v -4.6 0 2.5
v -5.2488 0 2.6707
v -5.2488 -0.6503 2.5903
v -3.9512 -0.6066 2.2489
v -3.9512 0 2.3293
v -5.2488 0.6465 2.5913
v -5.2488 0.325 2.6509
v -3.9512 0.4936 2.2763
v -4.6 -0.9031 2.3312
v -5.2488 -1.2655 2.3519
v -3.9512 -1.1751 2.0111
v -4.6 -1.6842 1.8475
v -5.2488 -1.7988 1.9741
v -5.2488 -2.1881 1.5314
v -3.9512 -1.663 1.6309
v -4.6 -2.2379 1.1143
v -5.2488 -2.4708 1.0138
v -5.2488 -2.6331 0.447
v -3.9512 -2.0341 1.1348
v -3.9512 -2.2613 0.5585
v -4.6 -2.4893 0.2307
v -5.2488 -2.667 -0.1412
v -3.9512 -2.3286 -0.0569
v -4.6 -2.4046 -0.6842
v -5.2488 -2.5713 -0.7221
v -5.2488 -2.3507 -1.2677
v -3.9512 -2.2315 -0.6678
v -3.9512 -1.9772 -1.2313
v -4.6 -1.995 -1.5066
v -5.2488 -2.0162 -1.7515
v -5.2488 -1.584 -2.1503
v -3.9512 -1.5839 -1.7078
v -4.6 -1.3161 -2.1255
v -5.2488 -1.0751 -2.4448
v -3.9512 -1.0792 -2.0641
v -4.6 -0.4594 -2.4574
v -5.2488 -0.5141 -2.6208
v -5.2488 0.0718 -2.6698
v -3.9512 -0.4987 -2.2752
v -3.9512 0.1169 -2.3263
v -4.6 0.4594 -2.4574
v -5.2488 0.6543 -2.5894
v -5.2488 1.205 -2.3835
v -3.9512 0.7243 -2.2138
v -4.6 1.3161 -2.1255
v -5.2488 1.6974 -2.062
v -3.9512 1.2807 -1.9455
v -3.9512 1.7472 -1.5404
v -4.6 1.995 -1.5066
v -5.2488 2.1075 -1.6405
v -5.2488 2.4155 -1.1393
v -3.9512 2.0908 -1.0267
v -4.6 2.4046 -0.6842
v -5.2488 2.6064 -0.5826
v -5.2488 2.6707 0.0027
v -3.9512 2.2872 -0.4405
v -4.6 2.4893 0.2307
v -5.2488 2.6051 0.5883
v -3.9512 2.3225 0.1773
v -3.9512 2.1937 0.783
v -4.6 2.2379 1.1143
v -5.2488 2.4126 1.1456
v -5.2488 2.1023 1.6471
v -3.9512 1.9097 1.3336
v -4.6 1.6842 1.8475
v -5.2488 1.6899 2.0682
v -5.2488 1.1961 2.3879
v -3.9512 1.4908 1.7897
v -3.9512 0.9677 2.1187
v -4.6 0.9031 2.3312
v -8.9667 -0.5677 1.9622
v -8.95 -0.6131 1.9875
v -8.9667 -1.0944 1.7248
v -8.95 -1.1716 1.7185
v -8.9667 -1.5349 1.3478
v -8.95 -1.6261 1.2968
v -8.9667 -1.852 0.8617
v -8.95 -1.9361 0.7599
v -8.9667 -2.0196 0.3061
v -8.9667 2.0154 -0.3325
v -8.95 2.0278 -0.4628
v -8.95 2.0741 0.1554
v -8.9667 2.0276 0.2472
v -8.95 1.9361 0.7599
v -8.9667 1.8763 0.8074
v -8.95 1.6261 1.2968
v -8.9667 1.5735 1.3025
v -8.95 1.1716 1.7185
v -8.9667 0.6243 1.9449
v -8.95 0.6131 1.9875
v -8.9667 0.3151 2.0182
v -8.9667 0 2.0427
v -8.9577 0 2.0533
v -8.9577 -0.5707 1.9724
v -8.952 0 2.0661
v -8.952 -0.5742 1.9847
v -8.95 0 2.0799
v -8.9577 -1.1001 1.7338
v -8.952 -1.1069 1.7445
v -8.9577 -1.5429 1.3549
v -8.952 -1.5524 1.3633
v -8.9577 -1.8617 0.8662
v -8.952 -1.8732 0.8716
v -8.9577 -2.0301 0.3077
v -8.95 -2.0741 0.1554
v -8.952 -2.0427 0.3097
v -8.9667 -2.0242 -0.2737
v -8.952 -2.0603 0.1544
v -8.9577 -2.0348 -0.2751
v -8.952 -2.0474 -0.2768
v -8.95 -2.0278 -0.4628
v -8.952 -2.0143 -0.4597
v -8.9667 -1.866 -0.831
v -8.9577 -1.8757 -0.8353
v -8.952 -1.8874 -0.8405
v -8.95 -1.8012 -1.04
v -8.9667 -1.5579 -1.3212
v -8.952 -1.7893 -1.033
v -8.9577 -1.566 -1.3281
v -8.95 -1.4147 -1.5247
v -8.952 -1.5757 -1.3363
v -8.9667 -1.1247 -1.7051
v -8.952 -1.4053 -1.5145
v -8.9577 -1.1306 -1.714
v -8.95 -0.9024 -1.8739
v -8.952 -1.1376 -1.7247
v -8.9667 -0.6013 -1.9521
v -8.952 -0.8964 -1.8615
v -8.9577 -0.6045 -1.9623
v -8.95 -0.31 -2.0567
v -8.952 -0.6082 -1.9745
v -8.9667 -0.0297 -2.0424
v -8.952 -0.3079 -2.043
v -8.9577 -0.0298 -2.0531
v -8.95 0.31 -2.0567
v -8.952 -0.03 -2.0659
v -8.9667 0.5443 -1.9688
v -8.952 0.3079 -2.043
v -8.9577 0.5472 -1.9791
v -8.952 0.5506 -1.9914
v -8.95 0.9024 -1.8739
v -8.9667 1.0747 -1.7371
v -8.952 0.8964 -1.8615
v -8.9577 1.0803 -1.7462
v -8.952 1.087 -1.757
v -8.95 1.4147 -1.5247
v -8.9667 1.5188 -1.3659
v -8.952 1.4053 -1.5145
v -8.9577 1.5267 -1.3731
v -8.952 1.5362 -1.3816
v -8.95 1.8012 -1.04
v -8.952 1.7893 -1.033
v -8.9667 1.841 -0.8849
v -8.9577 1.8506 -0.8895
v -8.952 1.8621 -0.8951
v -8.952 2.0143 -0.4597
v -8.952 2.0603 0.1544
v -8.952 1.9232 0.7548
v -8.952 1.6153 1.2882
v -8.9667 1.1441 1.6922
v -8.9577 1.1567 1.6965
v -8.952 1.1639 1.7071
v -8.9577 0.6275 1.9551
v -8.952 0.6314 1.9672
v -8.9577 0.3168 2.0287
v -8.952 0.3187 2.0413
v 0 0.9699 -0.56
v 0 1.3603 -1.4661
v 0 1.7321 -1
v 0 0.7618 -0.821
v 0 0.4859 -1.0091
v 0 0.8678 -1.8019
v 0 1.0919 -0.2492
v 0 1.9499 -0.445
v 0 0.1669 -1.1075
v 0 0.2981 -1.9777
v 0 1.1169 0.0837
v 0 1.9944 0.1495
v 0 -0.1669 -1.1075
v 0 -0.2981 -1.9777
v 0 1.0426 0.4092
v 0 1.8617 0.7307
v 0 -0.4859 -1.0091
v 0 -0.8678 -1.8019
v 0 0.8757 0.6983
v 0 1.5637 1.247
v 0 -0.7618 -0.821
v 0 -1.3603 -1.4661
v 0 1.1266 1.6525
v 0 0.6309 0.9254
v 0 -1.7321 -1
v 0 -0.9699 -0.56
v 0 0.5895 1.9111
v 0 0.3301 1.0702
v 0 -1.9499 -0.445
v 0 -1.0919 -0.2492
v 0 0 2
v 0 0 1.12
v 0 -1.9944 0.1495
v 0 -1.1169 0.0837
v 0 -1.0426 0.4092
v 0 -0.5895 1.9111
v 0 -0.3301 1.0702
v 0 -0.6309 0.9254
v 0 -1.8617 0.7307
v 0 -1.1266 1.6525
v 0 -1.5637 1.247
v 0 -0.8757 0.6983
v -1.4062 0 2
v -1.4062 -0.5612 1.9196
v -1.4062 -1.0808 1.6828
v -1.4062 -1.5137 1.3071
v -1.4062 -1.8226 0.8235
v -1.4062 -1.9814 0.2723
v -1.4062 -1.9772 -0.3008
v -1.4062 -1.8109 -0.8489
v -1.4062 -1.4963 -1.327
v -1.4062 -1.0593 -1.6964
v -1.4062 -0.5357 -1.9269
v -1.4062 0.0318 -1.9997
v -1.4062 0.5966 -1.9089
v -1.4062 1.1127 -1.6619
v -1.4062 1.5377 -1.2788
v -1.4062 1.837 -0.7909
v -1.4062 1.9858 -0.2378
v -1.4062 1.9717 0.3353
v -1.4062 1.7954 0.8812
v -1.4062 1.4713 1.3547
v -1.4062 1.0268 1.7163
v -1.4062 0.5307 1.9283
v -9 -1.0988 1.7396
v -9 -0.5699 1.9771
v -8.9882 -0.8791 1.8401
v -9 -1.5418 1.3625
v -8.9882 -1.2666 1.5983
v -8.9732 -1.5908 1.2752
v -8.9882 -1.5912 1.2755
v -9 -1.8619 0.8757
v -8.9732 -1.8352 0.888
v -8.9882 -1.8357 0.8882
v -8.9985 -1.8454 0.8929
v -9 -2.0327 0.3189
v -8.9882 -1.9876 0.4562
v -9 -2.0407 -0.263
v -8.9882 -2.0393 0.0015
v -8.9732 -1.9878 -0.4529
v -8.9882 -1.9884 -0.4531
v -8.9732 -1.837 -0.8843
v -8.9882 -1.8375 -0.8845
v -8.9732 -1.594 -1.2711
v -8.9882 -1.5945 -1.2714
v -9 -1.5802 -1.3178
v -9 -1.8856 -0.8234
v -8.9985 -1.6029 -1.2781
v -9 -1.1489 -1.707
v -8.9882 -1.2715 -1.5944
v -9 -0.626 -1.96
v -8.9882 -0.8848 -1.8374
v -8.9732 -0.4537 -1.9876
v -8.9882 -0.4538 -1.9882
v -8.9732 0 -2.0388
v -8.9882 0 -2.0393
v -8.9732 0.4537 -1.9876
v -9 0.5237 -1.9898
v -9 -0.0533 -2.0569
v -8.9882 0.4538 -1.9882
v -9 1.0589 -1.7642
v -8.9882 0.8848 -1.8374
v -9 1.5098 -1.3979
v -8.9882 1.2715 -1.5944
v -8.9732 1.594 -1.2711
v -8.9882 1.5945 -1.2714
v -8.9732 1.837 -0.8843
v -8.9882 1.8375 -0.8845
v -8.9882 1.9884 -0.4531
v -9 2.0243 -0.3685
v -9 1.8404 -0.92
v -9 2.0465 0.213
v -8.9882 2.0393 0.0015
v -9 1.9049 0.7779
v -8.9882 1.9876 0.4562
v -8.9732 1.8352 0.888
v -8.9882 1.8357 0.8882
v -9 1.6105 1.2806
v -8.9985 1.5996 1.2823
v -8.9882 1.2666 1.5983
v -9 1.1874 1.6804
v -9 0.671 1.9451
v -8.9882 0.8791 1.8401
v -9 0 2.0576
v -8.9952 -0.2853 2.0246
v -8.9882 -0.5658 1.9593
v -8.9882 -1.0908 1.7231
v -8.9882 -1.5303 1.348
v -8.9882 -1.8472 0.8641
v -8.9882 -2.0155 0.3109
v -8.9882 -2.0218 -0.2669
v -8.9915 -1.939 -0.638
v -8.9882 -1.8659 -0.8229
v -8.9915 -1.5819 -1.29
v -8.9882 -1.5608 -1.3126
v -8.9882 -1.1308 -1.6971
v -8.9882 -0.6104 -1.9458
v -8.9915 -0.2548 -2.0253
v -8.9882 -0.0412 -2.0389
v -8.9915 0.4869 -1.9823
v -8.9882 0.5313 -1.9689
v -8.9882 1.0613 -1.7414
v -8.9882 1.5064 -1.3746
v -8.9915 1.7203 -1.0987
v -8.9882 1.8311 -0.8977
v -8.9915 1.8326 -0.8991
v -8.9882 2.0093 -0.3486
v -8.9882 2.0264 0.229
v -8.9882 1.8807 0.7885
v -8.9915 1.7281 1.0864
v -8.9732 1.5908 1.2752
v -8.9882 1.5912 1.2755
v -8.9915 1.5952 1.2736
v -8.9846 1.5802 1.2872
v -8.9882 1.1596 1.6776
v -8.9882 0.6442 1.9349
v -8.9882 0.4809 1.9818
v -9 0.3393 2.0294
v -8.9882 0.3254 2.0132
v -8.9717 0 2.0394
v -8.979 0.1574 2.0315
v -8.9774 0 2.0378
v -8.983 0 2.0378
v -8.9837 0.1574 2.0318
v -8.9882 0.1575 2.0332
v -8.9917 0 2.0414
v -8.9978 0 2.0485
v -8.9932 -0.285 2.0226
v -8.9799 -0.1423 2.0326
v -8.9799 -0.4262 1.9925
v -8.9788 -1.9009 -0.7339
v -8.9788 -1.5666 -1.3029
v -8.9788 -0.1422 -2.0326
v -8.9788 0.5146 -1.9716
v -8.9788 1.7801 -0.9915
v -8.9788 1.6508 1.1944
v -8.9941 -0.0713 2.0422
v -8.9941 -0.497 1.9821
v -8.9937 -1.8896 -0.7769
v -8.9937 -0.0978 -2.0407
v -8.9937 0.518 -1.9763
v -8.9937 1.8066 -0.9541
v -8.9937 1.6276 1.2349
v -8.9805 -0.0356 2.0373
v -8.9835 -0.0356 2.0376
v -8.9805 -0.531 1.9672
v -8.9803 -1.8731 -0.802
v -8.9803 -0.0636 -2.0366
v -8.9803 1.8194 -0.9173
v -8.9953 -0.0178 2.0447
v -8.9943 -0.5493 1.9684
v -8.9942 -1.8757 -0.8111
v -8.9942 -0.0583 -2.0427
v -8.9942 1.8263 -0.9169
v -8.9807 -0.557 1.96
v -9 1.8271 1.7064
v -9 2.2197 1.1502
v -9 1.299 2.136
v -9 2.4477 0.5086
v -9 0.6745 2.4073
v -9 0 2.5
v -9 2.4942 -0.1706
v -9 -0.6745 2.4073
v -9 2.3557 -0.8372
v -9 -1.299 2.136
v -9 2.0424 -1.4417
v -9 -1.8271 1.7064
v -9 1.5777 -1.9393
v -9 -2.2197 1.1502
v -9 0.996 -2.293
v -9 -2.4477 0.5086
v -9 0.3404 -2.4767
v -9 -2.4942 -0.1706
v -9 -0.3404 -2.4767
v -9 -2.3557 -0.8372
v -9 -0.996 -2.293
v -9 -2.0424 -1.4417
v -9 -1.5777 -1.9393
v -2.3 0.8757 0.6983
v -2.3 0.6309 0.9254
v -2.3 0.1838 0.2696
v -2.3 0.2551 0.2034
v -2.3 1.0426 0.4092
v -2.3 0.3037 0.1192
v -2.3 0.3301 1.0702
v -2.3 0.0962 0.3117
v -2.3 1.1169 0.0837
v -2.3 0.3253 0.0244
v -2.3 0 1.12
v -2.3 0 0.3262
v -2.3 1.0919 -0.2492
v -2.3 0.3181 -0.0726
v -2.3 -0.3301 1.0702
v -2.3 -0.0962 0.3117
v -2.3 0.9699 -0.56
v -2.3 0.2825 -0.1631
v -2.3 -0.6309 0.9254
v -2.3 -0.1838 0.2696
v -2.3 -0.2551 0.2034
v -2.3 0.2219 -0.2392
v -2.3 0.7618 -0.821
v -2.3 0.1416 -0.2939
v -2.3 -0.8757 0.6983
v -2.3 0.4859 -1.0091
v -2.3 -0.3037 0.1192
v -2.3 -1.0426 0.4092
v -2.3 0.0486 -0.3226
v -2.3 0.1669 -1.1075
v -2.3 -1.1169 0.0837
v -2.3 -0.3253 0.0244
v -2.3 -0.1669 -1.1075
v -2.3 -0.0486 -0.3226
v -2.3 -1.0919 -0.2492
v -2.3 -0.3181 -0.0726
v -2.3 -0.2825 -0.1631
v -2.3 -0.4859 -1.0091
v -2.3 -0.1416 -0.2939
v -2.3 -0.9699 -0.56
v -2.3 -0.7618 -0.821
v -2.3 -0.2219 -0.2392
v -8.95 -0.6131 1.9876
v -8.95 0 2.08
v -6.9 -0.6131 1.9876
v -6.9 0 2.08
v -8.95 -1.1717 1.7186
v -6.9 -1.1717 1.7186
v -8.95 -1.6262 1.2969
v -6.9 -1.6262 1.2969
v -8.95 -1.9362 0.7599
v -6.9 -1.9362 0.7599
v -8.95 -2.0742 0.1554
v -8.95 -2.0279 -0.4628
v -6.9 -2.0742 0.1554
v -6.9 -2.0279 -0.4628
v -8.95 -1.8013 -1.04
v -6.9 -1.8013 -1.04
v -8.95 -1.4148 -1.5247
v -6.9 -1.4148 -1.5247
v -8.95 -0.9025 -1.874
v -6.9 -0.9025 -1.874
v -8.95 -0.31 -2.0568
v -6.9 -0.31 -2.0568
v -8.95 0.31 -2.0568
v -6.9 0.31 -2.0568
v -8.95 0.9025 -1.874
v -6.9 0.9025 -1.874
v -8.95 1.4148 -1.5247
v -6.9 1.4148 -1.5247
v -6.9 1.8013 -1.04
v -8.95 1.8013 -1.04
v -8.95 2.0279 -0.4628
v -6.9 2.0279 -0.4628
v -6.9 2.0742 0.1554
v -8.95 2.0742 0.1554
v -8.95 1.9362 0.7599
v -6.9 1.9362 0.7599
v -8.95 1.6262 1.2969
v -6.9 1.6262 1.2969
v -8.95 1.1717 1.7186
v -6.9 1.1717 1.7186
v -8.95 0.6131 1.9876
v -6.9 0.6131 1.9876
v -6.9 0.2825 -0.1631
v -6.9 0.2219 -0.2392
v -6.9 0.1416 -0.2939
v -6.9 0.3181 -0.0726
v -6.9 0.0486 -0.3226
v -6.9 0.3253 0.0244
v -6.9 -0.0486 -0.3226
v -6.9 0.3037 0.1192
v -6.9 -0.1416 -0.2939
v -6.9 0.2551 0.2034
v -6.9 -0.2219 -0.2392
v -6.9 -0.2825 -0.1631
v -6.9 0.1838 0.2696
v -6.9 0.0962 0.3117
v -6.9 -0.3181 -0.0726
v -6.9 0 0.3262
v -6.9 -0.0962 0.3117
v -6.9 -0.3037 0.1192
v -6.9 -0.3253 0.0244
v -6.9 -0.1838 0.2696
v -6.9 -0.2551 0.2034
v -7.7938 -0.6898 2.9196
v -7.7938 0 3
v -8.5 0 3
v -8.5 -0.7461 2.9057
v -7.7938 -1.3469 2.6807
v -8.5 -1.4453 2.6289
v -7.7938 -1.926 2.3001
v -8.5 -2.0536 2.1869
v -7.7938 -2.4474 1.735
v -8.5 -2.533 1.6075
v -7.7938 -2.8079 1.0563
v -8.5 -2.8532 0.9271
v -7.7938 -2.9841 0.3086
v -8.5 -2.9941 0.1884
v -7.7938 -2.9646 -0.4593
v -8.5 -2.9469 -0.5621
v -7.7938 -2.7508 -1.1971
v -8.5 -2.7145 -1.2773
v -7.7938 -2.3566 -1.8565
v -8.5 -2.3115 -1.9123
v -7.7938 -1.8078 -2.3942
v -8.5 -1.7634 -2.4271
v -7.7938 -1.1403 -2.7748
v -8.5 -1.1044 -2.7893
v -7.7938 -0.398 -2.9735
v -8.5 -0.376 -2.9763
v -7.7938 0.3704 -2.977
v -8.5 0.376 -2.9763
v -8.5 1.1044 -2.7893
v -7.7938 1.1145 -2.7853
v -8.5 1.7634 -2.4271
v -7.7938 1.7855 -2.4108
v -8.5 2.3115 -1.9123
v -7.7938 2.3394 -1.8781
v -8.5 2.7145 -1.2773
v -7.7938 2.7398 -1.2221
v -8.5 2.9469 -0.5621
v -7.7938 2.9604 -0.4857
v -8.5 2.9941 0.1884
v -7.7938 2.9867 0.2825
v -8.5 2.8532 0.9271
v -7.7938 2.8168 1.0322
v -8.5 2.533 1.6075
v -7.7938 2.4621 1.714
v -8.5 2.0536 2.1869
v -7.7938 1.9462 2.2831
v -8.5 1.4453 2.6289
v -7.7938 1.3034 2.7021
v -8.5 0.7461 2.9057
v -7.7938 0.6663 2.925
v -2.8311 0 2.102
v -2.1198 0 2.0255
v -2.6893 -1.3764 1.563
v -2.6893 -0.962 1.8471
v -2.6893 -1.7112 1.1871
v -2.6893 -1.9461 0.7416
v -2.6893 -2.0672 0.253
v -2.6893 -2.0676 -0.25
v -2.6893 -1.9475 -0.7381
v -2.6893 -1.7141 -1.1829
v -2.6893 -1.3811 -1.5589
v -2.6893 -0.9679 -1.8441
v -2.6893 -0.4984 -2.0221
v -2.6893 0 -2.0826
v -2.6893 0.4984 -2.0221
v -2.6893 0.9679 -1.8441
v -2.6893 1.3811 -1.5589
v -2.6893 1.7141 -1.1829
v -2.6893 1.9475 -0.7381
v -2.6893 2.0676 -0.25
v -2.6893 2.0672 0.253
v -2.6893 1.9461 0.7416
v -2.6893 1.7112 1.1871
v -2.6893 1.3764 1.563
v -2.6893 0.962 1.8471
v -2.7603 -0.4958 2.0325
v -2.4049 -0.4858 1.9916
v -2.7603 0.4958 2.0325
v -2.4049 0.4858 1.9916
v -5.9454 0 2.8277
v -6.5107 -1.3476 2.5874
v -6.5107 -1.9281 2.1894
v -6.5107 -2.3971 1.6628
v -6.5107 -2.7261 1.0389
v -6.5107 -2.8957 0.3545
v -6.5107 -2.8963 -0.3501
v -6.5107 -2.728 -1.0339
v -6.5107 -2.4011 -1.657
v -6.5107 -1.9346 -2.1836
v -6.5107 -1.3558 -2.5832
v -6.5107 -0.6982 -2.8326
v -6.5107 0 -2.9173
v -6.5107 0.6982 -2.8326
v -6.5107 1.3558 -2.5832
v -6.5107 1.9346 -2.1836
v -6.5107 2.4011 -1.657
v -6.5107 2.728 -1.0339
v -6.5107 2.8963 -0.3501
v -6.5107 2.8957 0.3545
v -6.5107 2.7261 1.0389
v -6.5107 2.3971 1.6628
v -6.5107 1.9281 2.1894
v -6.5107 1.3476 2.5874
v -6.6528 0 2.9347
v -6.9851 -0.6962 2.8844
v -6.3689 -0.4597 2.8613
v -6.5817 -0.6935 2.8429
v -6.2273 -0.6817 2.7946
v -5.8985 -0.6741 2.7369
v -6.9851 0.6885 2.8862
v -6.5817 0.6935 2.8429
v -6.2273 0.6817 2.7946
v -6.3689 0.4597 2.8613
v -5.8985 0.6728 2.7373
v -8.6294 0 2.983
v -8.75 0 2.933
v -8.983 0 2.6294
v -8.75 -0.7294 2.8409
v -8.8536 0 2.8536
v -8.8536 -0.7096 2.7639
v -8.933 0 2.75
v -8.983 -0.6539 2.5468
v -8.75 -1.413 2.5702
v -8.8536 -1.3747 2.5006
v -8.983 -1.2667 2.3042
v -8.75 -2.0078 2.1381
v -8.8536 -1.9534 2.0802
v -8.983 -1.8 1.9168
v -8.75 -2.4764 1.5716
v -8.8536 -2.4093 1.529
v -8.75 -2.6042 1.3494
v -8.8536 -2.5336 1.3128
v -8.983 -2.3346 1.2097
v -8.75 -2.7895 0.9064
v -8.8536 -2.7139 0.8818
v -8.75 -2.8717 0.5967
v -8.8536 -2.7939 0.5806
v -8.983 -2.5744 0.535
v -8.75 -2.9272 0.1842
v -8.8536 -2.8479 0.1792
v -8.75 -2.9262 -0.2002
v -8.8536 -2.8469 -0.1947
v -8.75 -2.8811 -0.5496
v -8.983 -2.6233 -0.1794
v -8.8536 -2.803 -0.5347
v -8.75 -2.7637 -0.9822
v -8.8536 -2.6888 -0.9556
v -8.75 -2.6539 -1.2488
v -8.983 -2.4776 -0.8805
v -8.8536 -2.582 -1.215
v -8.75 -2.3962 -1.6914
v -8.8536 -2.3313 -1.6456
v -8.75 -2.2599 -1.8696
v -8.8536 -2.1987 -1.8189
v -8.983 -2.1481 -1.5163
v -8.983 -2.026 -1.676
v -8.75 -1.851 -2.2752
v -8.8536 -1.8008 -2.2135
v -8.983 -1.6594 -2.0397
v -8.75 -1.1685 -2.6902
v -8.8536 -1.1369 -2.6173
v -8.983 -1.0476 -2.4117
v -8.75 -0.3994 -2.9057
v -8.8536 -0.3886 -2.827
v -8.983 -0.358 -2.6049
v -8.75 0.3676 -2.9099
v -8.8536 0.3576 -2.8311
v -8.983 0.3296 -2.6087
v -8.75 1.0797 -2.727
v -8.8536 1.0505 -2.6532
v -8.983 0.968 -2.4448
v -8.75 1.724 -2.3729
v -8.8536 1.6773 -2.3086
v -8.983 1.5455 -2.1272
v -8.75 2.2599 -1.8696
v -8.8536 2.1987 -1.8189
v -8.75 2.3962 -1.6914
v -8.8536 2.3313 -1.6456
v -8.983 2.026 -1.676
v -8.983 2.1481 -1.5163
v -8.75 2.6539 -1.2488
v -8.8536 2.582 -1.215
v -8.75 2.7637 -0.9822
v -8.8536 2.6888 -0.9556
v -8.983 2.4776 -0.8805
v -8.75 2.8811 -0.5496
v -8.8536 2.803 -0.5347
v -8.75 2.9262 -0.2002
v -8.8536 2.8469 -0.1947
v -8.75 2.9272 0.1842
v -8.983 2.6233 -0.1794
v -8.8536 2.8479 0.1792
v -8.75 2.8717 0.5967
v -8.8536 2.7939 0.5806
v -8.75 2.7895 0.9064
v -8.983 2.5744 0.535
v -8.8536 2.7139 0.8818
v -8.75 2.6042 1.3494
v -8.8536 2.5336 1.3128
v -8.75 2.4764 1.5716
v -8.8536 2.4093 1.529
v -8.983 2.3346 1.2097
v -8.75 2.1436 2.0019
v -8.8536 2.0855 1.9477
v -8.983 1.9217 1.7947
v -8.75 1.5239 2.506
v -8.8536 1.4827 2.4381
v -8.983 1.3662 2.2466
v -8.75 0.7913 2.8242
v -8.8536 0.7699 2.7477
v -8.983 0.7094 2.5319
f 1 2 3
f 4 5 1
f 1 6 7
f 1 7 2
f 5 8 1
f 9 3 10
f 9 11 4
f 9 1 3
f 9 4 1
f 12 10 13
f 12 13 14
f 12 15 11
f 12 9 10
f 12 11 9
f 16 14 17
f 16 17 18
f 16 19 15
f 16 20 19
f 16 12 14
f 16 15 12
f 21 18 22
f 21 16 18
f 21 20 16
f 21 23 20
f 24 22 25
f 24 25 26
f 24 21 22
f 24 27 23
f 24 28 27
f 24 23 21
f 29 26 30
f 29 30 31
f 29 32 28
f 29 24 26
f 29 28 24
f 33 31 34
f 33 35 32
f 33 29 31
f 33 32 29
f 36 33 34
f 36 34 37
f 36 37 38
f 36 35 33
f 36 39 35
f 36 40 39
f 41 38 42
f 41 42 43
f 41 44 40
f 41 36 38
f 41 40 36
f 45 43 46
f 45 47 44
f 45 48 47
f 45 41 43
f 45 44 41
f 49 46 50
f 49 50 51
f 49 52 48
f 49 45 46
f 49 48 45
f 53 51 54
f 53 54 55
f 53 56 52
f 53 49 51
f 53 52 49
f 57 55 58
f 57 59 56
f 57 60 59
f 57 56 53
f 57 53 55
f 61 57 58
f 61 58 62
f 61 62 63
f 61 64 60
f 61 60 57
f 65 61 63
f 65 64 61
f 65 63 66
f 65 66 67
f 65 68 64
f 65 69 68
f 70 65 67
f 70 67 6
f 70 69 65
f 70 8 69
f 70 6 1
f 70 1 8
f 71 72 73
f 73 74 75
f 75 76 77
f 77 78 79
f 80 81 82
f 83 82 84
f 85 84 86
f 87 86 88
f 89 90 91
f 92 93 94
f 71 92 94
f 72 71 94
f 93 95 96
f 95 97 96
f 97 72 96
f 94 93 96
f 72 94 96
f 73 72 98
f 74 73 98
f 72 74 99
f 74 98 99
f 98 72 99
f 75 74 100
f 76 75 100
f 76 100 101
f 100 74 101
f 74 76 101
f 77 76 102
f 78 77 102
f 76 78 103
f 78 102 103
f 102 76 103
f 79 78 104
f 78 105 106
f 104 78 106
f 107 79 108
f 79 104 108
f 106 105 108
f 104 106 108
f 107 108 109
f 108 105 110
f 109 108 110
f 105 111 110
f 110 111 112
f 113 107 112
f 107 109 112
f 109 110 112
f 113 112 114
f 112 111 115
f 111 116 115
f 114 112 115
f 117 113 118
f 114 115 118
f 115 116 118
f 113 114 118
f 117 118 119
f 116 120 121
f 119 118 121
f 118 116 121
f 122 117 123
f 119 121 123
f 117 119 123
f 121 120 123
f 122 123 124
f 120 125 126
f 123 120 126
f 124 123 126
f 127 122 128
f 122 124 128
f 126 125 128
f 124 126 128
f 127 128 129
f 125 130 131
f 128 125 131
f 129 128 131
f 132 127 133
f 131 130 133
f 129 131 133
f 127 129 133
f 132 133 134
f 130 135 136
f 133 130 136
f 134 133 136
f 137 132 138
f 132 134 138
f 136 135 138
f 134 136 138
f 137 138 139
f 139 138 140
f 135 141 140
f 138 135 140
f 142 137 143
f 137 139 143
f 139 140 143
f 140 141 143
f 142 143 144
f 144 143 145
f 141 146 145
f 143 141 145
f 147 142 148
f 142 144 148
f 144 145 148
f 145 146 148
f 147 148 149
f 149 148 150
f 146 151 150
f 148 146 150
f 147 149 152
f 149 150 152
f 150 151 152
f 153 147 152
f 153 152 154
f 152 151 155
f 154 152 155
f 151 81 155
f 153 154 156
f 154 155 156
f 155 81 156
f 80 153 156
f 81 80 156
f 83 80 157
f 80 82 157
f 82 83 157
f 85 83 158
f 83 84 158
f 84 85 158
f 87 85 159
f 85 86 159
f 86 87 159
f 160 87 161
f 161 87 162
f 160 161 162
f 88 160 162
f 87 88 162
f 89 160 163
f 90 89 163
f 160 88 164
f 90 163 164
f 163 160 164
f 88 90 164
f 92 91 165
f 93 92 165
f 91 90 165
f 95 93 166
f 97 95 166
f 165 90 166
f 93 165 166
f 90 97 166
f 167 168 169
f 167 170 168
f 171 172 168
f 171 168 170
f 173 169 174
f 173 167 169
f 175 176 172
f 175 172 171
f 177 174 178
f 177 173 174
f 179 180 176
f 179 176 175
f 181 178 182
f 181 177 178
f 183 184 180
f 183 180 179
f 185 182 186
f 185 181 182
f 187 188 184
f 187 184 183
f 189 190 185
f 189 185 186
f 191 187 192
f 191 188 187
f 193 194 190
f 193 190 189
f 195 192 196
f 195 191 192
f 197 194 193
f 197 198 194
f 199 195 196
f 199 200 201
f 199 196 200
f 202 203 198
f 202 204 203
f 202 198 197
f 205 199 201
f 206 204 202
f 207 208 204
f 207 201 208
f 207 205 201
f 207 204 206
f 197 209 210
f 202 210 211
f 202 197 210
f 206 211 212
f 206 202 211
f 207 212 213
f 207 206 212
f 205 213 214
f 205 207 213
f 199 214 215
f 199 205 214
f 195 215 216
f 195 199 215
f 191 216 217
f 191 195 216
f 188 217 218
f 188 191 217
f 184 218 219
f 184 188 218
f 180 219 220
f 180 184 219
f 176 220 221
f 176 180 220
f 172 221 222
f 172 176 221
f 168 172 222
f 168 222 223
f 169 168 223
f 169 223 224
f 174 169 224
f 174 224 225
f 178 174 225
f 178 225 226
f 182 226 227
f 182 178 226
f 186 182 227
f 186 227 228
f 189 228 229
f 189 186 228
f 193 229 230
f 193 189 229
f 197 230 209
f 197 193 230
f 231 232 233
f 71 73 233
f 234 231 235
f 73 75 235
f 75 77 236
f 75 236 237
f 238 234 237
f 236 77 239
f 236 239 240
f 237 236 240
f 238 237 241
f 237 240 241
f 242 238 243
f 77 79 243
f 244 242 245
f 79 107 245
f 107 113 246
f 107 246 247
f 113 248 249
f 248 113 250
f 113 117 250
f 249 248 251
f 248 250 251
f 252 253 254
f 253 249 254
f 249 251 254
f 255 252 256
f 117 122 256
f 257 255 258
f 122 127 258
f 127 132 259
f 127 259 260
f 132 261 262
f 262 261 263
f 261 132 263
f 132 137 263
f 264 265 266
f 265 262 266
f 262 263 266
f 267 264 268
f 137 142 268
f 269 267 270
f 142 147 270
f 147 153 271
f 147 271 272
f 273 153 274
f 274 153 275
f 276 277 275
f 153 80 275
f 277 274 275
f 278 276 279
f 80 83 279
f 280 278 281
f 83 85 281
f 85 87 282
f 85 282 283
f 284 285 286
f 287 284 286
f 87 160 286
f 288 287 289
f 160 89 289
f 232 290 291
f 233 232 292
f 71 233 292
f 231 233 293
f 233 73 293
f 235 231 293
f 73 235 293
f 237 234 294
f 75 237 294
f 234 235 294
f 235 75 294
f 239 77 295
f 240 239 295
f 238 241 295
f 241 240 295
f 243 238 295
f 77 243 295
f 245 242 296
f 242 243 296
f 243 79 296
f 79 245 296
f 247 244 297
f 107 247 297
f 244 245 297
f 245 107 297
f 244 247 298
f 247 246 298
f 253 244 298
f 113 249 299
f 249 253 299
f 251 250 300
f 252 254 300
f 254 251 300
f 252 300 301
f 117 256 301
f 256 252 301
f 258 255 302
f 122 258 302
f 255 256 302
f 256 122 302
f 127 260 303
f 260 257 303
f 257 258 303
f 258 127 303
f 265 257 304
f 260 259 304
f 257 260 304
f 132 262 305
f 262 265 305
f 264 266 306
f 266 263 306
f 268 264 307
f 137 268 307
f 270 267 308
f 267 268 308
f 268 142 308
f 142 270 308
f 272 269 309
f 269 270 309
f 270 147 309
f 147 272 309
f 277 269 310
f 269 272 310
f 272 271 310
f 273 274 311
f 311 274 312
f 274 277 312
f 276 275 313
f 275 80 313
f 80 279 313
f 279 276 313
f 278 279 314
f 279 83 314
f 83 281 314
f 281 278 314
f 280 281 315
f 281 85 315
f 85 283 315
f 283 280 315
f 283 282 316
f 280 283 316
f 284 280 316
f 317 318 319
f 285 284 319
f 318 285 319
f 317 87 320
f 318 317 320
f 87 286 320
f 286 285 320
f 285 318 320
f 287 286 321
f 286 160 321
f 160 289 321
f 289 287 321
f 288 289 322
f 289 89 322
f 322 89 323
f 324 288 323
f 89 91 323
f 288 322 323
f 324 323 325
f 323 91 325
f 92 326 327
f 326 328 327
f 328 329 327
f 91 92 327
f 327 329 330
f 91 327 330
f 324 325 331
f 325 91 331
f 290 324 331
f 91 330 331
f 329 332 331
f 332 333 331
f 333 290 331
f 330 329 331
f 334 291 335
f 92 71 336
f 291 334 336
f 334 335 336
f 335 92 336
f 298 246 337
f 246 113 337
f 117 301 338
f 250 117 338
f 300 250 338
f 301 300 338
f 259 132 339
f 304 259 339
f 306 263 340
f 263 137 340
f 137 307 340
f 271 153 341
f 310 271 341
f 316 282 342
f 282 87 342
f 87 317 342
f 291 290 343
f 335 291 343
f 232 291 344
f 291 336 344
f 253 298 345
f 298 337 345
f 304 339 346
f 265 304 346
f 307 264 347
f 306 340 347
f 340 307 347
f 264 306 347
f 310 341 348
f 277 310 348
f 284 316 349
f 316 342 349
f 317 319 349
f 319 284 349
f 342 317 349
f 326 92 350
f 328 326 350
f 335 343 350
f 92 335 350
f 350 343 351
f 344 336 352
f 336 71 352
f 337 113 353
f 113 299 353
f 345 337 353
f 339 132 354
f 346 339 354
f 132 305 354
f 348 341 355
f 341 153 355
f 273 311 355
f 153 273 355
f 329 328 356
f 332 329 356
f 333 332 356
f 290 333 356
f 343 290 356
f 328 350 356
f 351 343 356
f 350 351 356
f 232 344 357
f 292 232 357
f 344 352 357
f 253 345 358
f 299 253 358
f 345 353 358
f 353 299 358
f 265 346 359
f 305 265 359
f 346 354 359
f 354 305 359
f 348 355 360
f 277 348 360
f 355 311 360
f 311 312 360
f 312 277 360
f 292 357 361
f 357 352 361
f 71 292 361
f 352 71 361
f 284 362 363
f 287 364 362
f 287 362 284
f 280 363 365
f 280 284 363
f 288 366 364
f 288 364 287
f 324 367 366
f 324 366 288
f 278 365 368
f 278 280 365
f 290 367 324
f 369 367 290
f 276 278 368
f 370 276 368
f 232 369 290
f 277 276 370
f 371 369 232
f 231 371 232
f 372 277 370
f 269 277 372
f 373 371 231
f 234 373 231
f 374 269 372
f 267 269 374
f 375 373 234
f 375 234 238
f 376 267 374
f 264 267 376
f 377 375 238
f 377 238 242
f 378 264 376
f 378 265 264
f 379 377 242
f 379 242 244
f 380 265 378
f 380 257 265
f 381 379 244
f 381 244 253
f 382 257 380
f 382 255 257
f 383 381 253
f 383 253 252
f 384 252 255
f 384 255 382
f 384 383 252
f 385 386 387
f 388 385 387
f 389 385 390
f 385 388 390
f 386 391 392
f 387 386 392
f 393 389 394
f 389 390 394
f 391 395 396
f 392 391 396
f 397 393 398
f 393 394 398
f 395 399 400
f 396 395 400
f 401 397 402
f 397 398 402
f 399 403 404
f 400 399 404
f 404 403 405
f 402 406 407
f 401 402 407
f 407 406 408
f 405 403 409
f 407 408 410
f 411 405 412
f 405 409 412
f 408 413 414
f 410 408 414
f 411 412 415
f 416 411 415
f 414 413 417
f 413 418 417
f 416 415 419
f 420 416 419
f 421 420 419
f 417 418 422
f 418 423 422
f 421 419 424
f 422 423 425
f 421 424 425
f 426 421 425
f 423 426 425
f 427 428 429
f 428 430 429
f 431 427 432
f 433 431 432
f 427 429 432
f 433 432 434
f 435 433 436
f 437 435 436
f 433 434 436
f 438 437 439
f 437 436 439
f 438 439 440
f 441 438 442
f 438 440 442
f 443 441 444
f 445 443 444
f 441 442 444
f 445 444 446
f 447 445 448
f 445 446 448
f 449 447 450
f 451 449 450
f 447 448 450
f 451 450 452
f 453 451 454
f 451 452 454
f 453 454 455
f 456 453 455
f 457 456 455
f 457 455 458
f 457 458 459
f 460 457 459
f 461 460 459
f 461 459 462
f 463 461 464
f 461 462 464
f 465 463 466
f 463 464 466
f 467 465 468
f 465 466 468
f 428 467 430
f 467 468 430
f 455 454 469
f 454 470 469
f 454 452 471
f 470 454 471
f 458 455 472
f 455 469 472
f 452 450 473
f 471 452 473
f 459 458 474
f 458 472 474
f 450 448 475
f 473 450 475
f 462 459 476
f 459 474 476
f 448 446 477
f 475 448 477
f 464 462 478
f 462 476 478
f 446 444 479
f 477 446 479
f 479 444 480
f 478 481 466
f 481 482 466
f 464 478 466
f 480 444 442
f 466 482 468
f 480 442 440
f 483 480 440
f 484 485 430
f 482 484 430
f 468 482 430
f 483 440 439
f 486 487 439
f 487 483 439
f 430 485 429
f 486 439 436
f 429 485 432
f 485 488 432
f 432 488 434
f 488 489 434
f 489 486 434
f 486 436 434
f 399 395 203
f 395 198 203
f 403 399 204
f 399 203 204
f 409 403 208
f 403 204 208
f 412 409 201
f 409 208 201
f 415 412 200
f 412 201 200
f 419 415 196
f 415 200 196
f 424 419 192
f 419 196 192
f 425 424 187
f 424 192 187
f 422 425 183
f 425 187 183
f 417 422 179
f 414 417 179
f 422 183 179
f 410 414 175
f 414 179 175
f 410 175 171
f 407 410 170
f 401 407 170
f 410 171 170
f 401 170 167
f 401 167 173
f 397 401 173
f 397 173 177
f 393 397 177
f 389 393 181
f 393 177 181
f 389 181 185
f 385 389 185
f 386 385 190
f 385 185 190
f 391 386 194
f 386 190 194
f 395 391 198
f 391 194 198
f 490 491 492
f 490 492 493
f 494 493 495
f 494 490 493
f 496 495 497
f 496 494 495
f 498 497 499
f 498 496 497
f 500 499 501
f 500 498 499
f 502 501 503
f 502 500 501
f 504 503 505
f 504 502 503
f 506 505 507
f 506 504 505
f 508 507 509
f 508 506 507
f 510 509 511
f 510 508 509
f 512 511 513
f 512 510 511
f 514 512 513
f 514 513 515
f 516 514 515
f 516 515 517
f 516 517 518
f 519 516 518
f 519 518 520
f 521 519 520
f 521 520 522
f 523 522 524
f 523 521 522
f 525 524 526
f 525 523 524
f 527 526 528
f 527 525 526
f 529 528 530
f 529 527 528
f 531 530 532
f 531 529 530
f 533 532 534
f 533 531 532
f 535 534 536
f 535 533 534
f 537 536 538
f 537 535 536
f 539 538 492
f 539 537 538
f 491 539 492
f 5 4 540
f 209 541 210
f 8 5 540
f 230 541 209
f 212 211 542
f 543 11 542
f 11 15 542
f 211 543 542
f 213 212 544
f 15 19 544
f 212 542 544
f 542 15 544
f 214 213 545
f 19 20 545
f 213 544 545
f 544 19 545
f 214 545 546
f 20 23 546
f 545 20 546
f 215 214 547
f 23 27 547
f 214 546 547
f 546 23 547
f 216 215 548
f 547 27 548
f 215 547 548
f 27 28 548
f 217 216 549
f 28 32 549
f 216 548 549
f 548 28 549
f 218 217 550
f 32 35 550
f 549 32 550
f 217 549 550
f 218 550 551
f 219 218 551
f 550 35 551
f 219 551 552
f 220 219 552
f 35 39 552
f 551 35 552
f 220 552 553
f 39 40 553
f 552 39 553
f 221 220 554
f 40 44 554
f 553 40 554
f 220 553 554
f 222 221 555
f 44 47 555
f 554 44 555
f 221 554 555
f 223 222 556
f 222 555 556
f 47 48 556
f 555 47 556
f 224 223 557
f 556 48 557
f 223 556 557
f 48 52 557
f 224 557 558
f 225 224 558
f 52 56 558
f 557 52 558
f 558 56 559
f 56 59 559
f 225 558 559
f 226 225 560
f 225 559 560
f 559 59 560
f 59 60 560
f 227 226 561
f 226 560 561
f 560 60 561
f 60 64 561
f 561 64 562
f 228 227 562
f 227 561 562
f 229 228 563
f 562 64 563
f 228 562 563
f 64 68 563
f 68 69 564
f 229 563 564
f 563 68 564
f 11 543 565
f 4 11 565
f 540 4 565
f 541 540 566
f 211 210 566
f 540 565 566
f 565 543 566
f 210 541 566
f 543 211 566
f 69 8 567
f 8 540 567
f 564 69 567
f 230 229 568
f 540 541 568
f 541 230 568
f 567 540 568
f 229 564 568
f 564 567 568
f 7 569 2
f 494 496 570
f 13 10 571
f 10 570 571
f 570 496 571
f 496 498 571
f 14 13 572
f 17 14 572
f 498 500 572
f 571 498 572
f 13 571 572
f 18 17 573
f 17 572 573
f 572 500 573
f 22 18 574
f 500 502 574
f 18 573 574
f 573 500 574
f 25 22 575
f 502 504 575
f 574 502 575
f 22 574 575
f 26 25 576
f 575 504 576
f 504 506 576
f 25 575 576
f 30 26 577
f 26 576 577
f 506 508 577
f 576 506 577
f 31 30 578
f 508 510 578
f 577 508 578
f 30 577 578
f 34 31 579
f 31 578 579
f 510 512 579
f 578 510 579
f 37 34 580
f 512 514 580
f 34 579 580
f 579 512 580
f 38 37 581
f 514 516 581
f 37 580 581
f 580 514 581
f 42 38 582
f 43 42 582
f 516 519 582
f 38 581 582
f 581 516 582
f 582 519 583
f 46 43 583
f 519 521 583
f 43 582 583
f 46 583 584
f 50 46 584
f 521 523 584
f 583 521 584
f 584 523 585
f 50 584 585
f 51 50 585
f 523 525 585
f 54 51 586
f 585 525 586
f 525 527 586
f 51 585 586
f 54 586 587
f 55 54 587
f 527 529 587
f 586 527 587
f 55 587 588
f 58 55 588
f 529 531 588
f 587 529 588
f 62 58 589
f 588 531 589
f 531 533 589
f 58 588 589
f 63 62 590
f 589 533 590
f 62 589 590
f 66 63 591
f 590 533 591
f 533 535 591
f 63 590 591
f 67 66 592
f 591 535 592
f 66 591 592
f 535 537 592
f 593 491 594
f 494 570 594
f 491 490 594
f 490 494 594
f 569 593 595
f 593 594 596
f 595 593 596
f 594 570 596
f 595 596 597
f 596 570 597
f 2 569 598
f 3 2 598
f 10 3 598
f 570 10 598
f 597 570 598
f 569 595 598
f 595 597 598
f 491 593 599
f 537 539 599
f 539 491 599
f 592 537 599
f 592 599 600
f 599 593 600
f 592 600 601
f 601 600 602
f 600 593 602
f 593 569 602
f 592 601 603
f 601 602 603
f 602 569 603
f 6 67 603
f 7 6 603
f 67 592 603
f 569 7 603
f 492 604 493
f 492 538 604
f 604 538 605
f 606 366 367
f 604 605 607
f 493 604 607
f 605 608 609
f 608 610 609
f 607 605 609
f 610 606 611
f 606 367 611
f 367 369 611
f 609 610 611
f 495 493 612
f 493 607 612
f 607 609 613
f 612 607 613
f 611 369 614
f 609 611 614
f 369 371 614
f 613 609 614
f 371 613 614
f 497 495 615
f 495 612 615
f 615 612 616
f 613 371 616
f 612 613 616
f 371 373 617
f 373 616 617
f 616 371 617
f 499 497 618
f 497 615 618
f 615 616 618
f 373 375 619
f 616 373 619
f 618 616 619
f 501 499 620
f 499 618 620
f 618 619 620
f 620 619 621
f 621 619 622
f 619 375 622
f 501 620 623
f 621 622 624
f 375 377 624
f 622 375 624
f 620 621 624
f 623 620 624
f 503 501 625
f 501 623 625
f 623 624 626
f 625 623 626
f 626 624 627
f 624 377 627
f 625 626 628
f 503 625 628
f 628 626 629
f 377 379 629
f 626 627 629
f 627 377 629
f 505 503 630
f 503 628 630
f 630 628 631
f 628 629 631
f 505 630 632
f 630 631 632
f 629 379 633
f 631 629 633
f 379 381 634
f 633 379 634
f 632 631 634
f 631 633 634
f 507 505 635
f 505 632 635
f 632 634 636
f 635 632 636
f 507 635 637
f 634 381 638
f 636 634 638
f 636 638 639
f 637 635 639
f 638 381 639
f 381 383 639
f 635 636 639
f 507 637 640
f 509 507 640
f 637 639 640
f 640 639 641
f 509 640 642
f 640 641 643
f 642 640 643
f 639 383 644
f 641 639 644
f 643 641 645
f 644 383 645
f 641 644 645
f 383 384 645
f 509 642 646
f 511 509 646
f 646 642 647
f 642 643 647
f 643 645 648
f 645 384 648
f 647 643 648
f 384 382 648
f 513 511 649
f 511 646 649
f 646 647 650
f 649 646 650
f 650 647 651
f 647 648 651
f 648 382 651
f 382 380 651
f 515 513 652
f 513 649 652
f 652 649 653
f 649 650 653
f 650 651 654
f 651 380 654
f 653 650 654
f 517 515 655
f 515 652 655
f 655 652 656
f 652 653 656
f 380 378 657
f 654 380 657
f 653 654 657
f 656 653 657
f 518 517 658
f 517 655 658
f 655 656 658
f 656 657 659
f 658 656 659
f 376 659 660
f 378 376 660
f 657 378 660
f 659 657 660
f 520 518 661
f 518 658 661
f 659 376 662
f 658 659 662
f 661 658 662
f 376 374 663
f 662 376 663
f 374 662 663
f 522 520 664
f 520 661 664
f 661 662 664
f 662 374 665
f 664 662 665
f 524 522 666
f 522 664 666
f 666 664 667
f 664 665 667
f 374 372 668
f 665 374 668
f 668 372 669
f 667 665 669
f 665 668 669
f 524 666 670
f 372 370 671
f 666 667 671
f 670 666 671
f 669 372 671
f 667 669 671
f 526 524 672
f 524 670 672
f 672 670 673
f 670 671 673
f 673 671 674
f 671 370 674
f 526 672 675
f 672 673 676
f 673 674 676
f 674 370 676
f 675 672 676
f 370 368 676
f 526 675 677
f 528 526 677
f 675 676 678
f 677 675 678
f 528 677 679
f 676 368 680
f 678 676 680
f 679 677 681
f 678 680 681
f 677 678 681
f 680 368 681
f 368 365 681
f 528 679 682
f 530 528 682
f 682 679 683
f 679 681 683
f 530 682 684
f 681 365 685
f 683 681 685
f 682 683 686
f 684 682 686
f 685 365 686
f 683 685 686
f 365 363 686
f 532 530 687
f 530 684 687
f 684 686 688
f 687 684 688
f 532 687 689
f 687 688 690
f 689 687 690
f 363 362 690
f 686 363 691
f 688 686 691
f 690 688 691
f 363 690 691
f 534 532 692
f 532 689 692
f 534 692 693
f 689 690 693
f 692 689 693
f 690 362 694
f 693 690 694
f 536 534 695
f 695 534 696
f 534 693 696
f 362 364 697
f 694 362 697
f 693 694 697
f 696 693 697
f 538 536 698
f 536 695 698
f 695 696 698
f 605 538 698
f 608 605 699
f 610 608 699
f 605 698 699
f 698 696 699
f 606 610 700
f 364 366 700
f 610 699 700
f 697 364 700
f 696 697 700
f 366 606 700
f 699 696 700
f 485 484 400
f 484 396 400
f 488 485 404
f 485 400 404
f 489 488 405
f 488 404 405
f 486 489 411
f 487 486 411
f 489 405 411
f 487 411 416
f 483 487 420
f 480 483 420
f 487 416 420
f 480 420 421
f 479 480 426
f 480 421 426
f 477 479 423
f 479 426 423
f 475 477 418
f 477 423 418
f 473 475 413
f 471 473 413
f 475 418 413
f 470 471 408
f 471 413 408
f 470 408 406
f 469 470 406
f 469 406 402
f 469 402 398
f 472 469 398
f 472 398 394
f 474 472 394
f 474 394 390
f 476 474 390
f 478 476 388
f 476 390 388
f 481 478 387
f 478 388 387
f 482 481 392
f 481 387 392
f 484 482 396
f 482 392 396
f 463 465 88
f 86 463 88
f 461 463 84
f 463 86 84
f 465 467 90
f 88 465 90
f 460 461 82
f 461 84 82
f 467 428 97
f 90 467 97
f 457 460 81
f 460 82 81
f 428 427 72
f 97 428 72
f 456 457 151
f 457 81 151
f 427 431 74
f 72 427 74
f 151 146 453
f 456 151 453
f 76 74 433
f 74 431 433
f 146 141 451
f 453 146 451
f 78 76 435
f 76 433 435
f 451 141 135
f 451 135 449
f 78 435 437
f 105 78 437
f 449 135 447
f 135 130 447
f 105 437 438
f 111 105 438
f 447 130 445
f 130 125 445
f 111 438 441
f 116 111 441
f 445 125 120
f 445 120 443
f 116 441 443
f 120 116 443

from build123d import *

# Parameters (mm, degrees)
FILLET2_R = 0.05
FILLET4_R = 0.02
FILLET5_R = 10
FILLET6_R = 10
FILLET7_R = 0.5


with BuildPart() as part:
    # Sketch2 → Revolve1 (revolve)
    with BuildSketch(Plane.XY, mode=Mode.PRIVATE) as revolve1_sk:
        Polygon((-9, 0), (-9, 3), (-6.5, 3), (-2.7, 2), (0, 2), (0, 0), align=None)
    revolve(revolve1_sk.sketch.rotate(Axis((-11.002436832, 0, 0), (1, 0, 0)), 90), axis=Axis((-11.002436832, 0, 0), (1, 0, 0)))

    # Sketch1 → Cut-Revolve1 (revolve, cut)
    with BuildSketch(Plane.XY, mode=Mode.PRIVATE) as cut_revolve1_sk:
        Polygon((-9, 0), (-9, 2.03), (-8.95, 2.03), (-8.95, 2.08), (-6.9, 2.08), (-6.9, 0.326243131), (-2.3, 0.326243131), (-2.3, 1.12), (0, 1.12), (0, 0), align=None)
    revolve(cut_revolve1_sk.sketch.rotate(Axis((-11.002436832, 0, 0), (1, 0, 0)), 90), axis=Axis((-11.002436832, 0, 0), (1, 0, 0)), mode=Mode.SUBTRACT)

    # Fillet2
    fillet2_edges = [part.edges().sort_by_distance(p)[0] for p in [
        (-8.95, 0, -2.03),
    ]]
    fillet(fillet2_edges, radius=FILLET2_R - 0.0001)  # a hair under: the kernel refuses the full size

    # Fillet4
    fillet4_edges = [part.edges().sort_by_distance(p)[0] for p in [
        (-9, 0, -2.03),
    ]]
    fillet(fillet4_edges, radius=FILLET4_R)

    # Fillet5
    fillet5_edges = [part.edges().sort_by_distance(p)[0] for p in [
        (-6.5, 0, -3),
    ]]
    fillet(fillet5_edges, radius=FILLET5_R)

    # Fillet6
    fillet6_edges = [part.edges().sort_by_distance(p)[0] for p in [
        (-2.7, 0, -2),
    ]]
    fillet(fillet6_edges, radius=FILLET6_R)

    # Fillet7
    fillet7_edges = [part.edges().sort_by_distance(p)[0] for p in [
        (-9, 0, -3),
    ]]
    fillet(fillet7_edges, radius=FILLET7_R)


solid = part.part
